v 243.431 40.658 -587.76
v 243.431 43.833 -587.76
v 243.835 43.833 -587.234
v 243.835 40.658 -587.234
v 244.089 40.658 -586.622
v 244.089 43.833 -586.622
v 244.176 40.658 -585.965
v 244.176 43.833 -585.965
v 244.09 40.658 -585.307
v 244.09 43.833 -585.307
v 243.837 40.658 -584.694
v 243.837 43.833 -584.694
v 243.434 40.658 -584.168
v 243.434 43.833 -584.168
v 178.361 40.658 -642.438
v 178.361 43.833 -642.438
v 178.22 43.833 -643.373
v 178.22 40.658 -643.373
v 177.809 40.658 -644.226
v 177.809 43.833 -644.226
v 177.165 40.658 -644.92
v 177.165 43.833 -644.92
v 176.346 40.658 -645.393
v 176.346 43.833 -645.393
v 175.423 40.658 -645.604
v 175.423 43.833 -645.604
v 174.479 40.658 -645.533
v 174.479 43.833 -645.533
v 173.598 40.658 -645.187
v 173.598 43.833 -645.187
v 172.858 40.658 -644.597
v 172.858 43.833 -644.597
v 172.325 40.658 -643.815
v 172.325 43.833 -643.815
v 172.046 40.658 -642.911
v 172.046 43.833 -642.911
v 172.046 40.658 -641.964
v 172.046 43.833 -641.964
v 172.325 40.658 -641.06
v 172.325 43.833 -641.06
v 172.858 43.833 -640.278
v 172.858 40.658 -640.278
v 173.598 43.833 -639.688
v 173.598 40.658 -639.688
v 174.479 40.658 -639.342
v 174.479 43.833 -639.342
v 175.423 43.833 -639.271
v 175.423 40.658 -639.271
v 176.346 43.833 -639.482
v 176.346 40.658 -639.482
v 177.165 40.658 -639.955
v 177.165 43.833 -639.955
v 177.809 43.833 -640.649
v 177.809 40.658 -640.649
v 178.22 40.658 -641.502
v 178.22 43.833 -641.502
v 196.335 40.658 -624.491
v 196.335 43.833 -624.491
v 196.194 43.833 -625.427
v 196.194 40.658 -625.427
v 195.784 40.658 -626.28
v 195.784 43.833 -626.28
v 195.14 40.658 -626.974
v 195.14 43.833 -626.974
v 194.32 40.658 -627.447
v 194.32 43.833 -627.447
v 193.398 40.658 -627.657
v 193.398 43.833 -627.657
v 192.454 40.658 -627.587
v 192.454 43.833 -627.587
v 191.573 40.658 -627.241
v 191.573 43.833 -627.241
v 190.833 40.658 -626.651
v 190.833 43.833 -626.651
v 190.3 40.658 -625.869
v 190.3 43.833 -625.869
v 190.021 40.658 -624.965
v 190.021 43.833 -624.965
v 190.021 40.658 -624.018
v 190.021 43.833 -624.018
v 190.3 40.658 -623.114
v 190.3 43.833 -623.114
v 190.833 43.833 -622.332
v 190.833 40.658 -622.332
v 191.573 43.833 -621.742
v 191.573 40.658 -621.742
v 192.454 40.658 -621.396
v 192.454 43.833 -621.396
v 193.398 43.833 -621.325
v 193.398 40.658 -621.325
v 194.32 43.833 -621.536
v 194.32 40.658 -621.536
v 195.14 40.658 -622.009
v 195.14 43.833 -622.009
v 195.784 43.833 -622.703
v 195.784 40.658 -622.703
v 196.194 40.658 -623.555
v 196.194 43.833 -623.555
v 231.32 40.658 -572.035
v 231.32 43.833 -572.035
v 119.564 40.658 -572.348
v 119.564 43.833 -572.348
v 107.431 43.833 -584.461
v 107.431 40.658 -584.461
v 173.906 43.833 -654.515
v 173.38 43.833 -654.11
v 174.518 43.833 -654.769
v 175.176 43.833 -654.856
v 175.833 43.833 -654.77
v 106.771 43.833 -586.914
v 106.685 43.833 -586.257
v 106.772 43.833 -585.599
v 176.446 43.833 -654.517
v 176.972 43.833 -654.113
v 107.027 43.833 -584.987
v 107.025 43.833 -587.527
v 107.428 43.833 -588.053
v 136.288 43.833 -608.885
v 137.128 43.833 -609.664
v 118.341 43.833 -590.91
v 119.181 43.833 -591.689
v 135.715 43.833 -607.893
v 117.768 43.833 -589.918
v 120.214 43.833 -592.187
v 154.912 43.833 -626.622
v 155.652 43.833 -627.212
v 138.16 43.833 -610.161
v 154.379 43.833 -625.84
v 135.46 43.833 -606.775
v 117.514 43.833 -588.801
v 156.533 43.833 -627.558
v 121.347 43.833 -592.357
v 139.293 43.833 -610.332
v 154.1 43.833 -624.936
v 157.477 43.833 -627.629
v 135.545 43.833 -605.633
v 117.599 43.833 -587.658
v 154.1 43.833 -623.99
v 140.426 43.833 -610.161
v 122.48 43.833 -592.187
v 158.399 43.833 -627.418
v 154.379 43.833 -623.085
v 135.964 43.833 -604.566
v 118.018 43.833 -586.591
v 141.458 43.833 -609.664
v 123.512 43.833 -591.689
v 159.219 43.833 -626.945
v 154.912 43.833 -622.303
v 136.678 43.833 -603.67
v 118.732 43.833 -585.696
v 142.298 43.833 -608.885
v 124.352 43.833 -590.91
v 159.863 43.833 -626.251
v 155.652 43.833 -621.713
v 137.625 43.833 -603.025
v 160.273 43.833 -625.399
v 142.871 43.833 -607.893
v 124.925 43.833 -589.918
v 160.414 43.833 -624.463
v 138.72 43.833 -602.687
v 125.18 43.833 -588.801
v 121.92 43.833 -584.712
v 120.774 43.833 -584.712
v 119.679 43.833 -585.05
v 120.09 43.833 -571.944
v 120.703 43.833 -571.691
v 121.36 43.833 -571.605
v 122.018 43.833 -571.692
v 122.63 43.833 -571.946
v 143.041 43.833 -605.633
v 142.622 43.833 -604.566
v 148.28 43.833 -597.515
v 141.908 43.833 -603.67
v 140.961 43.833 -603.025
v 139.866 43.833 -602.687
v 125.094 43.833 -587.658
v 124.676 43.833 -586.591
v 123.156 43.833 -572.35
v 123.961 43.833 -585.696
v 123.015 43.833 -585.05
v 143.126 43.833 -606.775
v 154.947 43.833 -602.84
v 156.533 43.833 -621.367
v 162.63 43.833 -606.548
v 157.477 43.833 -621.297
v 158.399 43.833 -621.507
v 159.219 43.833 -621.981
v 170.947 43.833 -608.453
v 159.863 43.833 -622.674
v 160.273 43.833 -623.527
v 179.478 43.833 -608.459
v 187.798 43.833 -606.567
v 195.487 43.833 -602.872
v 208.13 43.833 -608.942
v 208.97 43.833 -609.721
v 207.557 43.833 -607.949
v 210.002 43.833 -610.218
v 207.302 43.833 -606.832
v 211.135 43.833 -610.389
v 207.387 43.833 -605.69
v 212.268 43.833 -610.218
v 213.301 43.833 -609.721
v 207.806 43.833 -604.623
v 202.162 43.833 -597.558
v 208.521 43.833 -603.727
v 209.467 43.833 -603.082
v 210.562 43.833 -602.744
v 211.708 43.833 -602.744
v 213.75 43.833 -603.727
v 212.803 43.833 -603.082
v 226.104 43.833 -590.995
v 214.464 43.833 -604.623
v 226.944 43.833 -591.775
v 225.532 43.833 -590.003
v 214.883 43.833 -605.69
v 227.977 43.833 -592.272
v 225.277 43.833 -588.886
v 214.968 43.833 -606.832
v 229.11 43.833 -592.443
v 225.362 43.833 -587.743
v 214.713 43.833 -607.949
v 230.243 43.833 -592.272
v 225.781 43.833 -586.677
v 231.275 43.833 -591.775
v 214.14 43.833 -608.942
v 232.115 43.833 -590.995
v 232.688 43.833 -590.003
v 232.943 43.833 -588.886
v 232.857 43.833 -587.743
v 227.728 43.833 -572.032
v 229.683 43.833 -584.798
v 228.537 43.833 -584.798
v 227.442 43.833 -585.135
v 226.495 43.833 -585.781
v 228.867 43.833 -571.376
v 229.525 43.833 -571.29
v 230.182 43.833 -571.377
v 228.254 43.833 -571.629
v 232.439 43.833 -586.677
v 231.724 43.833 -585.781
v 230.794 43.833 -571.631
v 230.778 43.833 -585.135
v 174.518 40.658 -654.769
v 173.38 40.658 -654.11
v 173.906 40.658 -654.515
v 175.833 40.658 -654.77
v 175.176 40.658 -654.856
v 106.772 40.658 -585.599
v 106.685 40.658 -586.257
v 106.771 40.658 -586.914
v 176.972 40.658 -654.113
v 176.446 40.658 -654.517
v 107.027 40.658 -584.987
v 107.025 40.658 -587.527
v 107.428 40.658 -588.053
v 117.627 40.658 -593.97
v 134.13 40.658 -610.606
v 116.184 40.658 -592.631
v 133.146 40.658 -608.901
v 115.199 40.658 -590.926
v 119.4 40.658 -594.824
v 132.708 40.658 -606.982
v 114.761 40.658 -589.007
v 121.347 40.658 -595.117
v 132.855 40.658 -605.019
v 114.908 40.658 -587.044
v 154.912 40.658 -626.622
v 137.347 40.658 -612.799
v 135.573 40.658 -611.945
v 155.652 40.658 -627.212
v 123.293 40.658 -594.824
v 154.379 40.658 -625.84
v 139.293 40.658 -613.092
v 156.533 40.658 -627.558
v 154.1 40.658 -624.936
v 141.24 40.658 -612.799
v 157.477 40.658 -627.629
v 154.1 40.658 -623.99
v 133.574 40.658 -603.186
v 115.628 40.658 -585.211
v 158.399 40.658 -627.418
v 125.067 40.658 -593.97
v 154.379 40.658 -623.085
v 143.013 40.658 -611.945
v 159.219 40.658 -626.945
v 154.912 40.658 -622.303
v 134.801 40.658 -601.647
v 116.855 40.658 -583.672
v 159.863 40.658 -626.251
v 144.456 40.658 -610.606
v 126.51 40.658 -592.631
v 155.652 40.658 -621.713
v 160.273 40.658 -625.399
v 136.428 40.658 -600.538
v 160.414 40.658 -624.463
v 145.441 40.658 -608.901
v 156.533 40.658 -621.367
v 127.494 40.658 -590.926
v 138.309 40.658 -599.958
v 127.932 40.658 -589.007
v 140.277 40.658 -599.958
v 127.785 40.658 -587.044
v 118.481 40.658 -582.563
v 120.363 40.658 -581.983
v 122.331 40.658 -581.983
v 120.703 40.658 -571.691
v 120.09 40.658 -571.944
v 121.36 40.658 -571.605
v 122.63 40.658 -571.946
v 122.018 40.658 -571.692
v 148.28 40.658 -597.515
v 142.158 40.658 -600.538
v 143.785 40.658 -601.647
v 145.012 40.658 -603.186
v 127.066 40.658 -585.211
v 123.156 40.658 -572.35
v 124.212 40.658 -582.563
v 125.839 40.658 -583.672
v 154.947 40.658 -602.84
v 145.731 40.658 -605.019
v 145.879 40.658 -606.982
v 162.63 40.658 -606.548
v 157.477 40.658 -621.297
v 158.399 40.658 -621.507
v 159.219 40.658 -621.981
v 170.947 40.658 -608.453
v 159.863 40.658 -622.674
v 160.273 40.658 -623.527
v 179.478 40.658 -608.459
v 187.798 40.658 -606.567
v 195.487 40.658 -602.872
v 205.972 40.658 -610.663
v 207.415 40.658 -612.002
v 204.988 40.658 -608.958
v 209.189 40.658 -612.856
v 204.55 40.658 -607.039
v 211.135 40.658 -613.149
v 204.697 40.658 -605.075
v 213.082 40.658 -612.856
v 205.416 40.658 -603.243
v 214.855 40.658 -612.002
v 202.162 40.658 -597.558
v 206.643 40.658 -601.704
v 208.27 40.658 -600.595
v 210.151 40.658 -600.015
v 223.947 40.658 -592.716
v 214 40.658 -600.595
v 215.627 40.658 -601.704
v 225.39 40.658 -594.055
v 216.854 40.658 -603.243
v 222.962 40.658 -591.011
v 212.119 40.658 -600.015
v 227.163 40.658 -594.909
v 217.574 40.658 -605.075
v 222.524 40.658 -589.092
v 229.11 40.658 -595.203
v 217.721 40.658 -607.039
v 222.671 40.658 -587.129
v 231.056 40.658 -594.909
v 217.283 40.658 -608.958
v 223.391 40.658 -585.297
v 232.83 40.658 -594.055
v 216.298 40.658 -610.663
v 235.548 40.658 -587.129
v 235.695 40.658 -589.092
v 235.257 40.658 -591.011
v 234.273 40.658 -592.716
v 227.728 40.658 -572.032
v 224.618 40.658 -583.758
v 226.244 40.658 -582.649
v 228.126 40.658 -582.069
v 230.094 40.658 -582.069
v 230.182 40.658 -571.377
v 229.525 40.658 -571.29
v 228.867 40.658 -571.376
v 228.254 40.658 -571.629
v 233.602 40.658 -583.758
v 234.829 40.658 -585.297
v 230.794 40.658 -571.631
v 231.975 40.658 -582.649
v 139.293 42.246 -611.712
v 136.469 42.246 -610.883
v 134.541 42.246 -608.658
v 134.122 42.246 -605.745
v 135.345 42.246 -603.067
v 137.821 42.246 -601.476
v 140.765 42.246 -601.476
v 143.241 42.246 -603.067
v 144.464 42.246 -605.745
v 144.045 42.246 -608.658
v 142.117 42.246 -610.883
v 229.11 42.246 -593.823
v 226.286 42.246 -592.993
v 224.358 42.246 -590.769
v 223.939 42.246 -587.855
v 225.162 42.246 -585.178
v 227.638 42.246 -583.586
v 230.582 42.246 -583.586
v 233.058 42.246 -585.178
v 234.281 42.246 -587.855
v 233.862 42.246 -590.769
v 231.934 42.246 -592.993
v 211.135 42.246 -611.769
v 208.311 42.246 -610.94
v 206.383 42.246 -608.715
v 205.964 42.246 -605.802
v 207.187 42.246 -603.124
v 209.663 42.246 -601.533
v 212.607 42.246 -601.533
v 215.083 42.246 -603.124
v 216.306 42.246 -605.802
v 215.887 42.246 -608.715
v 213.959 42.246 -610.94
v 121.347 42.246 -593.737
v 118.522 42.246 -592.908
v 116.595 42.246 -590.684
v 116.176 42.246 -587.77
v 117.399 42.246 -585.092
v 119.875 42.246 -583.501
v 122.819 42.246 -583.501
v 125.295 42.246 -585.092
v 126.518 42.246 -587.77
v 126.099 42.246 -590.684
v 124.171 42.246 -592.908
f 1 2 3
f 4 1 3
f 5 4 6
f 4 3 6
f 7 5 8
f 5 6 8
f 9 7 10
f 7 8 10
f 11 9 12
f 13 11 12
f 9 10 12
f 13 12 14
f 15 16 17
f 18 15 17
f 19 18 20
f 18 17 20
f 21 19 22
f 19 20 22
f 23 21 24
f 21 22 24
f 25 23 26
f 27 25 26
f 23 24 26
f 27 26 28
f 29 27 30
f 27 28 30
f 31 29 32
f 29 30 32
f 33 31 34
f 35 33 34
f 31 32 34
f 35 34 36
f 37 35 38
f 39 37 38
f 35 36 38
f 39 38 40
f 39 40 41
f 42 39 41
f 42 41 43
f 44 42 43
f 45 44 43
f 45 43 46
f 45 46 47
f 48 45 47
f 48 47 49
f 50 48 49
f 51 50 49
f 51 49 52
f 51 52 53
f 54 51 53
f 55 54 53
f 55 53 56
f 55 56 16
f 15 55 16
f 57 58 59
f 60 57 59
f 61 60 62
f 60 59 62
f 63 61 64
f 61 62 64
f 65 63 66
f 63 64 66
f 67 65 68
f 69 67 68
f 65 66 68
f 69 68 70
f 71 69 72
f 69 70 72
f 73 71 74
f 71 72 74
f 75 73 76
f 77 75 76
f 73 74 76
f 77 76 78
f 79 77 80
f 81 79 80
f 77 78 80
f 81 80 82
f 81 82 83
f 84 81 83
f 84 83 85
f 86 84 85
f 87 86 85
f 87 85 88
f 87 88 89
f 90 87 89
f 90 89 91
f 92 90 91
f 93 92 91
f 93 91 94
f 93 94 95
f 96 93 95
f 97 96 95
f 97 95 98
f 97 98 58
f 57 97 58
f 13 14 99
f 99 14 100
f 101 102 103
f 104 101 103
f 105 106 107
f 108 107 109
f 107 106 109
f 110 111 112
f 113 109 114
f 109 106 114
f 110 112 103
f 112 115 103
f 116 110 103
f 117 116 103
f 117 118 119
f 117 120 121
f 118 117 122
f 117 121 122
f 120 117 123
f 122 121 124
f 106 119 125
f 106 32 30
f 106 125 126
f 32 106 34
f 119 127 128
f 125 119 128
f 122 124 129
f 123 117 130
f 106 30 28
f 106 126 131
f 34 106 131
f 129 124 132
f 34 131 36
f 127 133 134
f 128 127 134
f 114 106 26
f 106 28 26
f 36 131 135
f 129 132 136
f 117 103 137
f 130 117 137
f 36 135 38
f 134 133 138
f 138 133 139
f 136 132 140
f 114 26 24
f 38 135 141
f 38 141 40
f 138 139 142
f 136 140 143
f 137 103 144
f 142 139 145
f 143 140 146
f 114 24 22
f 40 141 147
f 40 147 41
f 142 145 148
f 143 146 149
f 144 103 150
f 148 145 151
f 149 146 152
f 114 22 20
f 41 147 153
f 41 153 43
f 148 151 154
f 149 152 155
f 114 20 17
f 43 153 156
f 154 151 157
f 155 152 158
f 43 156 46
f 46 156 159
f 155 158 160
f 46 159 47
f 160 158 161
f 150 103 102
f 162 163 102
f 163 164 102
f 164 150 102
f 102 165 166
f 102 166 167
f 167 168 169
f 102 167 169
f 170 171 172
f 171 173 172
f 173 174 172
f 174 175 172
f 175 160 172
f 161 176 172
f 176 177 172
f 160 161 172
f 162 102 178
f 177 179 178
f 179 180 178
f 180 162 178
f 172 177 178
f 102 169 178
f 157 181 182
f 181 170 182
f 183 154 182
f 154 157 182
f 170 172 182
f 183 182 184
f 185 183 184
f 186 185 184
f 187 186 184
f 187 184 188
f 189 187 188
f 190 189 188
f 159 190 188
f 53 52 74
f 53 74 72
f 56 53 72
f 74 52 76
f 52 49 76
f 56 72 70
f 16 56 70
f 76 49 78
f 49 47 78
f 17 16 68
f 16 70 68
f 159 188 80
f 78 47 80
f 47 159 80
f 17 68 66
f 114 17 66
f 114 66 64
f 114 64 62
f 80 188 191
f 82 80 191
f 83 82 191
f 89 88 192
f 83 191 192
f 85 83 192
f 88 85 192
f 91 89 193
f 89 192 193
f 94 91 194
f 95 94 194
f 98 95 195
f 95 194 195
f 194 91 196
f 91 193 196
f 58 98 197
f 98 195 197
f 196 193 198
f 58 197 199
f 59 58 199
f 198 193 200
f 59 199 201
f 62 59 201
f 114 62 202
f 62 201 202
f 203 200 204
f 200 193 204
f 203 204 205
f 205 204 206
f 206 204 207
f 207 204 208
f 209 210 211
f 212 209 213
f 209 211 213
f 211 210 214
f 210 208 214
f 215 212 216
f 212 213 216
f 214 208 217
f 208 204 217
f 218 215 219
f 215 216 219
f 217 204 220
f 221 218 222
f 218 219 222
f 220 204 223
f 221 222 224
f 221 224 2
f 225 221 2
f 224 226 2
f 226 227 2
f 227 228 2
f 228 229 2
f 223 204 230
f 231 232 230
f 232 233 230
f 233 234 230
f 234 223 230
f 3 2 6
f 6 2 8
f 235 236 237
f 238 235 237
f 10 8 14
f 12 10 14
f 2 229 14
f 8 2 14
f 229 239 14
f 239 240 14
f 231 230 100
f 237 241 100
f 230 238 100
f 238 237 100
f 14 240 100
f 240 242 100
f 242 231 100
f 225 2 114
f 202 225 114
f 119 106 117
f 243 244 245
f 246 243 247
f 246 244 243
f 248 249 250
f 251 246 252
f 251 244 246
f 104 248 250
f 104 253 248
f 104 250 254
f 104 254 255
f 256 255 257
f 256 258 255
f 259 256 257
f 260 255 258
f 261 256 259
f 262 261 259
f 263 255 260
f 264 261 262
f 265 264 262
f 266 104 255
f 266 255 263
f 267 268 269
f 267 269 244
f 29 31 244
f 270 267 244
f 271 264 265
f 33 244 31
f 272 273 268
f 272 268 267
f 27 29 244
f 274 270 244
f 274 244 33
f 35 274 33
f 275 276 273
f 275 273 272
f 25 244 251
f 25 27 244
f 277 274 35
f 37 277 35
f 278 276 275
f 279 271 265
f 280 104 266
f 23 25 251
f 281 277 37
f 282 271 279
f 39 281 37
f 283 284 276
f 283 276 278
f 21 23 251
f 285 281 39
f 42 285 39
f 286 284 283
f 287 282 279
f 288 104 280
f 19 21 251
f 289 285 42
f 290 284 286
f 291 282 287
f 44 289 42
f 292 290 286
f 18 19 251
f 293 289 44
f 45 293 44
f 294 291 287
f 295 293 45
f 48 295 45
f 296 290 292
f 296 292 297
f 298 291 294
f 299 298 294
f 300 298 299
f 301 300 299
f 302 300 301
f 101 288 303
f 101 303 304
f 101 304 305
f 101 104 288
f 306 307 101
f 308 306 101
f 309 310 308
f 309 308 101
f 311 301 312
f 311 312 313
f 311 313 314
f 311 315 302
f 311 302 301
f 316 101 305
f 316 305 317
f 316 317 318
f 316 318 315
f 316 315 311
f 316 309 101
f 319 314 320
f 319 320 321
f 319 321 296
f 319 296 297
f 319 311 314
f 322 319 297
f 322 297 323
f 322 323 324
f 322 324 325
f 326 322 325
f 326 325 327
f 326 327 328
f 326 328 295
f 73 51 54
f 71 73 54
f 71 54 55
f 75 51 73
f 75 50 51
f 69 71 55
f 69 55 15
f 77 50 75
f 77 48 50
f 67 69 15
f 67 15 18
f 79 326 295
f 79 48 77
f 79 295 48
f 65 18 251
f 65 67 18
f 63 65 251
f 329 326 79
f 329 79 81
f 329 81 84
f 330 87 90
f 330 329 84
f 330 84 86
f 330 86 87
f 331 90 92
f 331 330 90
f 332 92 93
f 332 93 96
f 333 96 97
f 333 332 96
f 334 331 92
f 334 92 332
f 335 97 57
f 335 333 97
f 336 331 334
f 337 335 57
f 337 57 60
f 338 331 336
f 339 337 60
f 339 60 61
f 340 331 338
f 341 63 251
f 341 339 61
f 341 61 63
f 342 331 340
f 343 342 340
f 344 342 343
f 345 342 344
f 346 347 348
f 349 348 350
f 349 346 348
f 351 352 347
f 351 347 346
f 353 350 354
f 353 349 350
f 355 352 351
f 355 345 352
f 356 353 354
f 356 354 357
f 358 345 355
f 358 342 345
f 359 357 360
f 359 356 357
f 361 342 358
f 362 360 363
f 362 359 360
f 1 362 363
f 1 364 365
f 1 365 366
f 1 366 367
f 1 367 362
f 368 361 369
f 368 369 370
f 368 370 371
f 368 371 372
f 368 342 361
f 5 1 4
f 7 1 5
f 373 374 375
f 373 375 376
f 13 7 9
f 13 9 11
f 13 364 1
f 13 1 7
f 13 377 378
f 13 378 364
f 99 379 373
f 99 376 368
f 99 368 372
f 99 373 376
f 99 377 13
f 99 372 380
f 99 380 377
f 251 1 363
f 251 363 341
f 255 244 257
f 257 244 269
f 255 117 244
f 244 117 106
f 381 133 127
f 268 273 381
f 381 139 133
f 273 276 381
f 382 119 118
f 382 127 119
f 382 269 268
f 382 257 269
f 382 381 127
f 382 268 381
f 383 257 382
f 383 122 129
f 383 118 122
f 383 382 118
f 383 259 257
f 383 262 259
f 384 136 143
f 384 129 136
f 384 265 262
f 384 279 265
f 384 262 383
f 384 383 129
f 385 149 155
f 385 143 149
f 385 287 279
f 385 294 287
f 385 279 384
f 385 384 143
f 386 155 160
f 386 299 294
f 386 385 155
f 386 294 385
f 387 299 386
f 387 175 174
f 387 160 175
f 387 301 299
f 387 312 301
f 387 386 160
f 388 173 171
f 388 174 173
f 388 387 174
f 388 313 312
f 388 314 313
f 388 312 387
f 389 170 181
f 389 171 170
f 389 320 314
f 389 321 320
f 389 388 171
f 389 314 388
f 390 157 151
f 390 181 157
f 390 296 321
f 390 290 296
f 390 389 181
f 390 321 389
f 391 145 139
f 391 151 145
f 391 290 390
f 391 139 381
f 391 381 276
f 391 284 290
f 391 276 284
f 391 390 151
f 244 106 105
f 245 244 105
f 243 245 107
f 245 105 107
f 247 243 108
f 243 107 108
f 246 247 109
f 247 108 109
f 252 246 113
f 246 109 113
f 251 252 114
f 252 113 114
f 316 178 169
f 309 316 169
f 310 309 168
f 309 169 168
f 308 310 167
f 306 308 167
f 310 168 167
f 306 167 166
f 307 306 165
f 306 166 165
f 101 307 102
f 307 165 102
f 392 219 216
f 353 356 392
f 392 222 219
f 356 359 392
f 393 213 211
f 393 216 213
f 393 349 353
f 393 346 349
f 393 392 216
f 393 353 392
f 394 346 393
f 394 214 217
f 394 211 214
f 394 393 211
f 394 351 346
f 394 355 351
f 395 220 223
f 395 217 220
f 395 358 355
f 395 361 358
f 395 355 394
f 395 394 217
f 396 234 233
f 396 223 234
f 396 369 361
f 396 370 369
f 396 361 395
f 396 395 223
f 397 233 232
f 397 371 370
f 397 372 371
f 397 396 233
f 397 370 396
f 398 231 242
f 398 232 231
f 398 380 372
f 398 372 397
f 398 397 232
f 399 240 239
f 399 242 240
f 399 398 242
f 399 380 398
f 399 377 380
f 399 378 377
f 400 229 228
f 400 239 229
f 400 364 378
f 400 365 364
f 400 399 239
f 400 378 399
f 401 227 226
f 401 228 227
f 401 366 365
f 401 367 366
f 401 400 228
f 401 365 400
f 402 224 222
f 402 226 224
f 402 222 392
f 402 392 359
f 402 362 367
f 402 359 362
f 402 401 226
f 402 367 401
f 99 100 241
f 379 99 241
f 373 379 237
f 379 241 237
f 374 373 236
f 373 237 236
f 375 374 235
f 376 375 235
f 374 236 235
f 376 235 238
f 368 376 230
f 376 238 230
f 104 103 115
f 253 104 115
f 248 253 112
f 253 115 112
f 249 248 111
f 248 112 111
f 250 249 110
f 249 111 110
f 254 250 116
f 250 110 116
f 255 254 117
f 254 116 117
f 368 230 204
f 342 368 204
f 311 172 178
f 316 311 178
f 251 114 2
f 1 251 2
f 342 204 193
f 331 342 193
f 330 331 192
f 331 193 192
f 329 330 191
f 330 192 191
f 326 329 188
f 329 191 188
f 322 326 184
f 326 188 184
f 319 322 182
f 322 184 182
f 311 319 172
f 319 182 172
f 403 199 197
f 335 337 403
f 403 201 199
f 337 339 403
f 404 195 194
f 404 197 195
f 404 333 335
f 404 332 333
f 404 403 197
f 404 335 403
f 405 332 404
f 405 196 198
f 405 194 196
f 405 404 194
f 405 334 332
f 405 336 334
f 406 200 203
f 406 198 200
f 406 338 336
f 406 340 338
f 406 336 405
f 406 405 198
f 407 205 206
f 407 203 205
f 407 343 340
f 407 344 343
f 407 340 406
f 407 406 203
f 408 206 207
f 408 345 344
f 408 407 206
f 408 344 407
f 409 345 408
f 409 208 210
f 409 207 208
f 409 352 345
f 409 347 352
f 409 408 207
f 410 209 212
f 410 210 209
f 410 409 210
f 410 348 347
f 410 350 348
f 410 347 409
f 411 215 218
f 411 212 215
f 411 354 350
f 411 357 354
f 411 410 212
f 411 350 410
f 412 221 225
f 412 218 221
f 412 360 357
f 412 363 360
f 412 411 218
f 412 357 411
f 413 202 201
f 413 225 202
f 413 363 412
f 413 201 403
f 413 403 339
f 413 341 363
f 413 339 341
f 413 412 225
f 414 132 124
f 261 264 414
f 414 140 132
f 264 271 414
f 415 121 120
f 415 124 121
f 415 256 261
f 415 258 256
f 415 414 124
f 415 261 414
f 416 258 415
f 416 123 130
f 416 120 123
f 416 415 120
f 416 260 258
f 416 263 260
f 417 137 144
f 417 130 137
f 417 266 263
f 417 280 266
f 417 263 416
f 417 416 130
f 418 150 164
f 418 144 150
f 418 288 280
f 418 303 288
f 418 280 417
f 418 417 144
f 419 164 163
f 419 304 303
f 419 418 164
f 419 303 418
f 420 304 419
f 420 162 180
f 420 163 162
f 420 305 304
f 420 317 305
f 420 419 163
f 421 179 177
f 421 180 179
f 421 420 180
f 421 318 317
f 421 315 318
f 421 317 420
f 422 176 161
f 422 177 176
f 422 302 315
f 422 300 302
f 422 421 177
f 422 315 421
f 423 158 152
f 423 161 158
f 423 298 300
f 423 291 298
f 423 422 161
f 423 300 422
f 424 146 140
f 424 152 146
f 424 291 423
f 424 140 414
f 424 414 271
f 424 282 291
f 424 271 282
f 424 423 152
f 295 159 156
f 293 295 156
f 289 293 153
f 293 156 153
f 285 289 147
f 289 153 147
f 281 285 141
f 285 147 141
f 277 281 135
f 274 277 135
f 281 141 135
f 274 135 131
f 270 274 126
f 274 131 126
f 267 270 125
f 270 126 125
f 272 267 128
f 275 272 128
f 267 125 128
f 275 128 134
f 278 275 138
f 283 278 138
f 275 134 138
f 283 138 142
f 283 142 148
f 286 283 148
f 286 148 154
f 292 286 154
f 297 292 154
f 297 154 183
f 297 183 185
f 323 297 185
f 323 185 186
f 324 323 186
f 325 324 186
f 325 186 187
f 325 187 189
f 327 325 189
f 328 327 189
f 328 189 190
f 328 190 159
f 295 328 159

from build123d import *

# Parameters (mm, degrees)
BOSS_EXTRUDE1_DEPTH                  = 3.175
F_1_4_0_25_DIAMETER_HOLE1_D          = 6.35
F_1_4_0_25_DIAMETER_HOLE3_AT_2_COUNT = 2
F_1_4_0_25_DIAMETER_HOLE3_AT_2_PITCH = 25.4
F_1_4_0_25_DIAMETER_HOLE3_AT_3_COUNT = 2
F_1_4_0_25_DIAMETER_HOLE3_AT_3_PITCH = 71.842048969
F_1_4_0_25_DIAMETER_HOLE3_AT_4_COUNT = 2
F_1_4_0_25_DIAMETER_HOLE3_AT_4_PITCH = 91.581002397


with BuildPart() as part:
    # Outline → Boss-Extrude1 (new body)
    with BuildSketch(Plane.XZ.offset(-43.833362877)):
        with BuildLine():
            Line((176.972439461, -654.113339272), (243.430903053, -587.760058499))
            ThreePointArc((243.430903053, -587.760058499), (244.176274012, -585.964597022), (243.433747886, -584.167957177))
            Line((243.433747886, -584.167957177), (231.320007239, -572.035013901))
            ThreePointArc((231.320007239, -572.035013901), (229.524545763, -571.289642942), (227.727905917, -572.032169067))
            Line((227.727905917, -572.032169067), (202.161954847, -597.557657288))
            ThreePointArc((202.161954847, -597.557657288), (175.212357167, -608.695549172), (148.280435018, -597.514984781))
            Line((148.280435018, -597.514984781), (123.155639602, -572.350361691))
            ThreePointArc((123.155639602, -572.350361691), (121.360178125, -571.604990731), (119.56353828, -572.347516857))
            Line((119.56353828, -572.347516857), (107.430595004, -584.461257504))
            ThreePointArc((107.430595004, -584.461257504), (106.685224045, -586.256718981), (107.42775017, -588.053358826))
            Line((107.42775017, -588.053358826), (173.380338139, -654.110494438))
            ThreePointArc((173.380338139, -654.110494438), (175.175799616, -654.855865397), (176.972439461, -654.113339272))
        make_face()
    extrude(amount=BOSS_EXTRUDE1_DEPTH)

    # 1/4 (0.25) Diameter Hole1 (through all)
    with Locations(Plane(origin=(0, 40.658362877, 0), x_dir=(-1, 0, 0), z_dir=(0, -1, 0))):
        with Locations((-175.18563451, 642.437587559), (-193.160365289, 624.491305118), (-157.239352069, 624.46285678)):
            Hole(F_1_4_0_25_DIAMETER_HOLE1_D / 2)

    # Sketch11 → 1/4 (0.25) Diameter Hole3 (revolve, cut)
    with BuildSketch(Plane(origin=(139.293069629, 40.658362877, -606.488126001), x_dir=(0, 0, -1), z_dir=(1, 0, 0))):
        Polygon((0, 0), (0, 3.175), (3.175, 3.175), (3.175, 3.944613268), (6.604, 0), align=None)
    f_1_4_0_25_diameter_hole3 = revolve(axis=Axis((139.293069629, 34.308362877, -606.488126001), (0, 1, 0)), mode=Mode.SUBTRACT)

    # 1/4 (0.25) Diameter Hole3 at 2: 1/4 (0.25) Diameter Hole3 ×2
    with Locations(*[Vector(-0.7065465527738991, 0, 0.7076665660912065) * (i * F_1_4_0_25_DIAMETER_HOLE3_AT_2_PITCH) for i in range(1, F_1_4_0_25_DIAMETER_HOLE3_AT_2_COUNT)]):
        add(f_1_4_0_25_diameter_hole3, mode=Mode.SUBTRACT)

    # 1/4 (0.25) Diameter Hole3 at 3: 1/4 (0.25) Diameter Hole3 ×2
    with Locations(*[Vector(0.9999996863924931, 0, -0.0007919690116880901) * (i * F_1_4_0_25_DIAMETER_HOLE3_AT_3_PITCH) for i in range(1, F_1_4_0_25_DIAMETER_HOLE3_AT_3_COUNT)]):
        add(f_1_4_0_25_diameter_hole3, mode=Mode.SUBTRACT)

    # 1/4 (0.25) Diameter Hole3 at 4: 1/4 (0.25) Diameter Hole3 ×2
    with Locations(*[Vector(0.980735686075181, 0, 0.1953394841260828) * (i * F_1_4_0_25_DIAMETER_HOLE3_AT_4_PITCH) for i in range(1, F_1_4_0_25_DIAMETER_HOLE3_AT_4_COUNT)]):
        add(f_1_4_0_25_diameter_hole3, mode=Mode.SUBTRACT)


solid = part.part
